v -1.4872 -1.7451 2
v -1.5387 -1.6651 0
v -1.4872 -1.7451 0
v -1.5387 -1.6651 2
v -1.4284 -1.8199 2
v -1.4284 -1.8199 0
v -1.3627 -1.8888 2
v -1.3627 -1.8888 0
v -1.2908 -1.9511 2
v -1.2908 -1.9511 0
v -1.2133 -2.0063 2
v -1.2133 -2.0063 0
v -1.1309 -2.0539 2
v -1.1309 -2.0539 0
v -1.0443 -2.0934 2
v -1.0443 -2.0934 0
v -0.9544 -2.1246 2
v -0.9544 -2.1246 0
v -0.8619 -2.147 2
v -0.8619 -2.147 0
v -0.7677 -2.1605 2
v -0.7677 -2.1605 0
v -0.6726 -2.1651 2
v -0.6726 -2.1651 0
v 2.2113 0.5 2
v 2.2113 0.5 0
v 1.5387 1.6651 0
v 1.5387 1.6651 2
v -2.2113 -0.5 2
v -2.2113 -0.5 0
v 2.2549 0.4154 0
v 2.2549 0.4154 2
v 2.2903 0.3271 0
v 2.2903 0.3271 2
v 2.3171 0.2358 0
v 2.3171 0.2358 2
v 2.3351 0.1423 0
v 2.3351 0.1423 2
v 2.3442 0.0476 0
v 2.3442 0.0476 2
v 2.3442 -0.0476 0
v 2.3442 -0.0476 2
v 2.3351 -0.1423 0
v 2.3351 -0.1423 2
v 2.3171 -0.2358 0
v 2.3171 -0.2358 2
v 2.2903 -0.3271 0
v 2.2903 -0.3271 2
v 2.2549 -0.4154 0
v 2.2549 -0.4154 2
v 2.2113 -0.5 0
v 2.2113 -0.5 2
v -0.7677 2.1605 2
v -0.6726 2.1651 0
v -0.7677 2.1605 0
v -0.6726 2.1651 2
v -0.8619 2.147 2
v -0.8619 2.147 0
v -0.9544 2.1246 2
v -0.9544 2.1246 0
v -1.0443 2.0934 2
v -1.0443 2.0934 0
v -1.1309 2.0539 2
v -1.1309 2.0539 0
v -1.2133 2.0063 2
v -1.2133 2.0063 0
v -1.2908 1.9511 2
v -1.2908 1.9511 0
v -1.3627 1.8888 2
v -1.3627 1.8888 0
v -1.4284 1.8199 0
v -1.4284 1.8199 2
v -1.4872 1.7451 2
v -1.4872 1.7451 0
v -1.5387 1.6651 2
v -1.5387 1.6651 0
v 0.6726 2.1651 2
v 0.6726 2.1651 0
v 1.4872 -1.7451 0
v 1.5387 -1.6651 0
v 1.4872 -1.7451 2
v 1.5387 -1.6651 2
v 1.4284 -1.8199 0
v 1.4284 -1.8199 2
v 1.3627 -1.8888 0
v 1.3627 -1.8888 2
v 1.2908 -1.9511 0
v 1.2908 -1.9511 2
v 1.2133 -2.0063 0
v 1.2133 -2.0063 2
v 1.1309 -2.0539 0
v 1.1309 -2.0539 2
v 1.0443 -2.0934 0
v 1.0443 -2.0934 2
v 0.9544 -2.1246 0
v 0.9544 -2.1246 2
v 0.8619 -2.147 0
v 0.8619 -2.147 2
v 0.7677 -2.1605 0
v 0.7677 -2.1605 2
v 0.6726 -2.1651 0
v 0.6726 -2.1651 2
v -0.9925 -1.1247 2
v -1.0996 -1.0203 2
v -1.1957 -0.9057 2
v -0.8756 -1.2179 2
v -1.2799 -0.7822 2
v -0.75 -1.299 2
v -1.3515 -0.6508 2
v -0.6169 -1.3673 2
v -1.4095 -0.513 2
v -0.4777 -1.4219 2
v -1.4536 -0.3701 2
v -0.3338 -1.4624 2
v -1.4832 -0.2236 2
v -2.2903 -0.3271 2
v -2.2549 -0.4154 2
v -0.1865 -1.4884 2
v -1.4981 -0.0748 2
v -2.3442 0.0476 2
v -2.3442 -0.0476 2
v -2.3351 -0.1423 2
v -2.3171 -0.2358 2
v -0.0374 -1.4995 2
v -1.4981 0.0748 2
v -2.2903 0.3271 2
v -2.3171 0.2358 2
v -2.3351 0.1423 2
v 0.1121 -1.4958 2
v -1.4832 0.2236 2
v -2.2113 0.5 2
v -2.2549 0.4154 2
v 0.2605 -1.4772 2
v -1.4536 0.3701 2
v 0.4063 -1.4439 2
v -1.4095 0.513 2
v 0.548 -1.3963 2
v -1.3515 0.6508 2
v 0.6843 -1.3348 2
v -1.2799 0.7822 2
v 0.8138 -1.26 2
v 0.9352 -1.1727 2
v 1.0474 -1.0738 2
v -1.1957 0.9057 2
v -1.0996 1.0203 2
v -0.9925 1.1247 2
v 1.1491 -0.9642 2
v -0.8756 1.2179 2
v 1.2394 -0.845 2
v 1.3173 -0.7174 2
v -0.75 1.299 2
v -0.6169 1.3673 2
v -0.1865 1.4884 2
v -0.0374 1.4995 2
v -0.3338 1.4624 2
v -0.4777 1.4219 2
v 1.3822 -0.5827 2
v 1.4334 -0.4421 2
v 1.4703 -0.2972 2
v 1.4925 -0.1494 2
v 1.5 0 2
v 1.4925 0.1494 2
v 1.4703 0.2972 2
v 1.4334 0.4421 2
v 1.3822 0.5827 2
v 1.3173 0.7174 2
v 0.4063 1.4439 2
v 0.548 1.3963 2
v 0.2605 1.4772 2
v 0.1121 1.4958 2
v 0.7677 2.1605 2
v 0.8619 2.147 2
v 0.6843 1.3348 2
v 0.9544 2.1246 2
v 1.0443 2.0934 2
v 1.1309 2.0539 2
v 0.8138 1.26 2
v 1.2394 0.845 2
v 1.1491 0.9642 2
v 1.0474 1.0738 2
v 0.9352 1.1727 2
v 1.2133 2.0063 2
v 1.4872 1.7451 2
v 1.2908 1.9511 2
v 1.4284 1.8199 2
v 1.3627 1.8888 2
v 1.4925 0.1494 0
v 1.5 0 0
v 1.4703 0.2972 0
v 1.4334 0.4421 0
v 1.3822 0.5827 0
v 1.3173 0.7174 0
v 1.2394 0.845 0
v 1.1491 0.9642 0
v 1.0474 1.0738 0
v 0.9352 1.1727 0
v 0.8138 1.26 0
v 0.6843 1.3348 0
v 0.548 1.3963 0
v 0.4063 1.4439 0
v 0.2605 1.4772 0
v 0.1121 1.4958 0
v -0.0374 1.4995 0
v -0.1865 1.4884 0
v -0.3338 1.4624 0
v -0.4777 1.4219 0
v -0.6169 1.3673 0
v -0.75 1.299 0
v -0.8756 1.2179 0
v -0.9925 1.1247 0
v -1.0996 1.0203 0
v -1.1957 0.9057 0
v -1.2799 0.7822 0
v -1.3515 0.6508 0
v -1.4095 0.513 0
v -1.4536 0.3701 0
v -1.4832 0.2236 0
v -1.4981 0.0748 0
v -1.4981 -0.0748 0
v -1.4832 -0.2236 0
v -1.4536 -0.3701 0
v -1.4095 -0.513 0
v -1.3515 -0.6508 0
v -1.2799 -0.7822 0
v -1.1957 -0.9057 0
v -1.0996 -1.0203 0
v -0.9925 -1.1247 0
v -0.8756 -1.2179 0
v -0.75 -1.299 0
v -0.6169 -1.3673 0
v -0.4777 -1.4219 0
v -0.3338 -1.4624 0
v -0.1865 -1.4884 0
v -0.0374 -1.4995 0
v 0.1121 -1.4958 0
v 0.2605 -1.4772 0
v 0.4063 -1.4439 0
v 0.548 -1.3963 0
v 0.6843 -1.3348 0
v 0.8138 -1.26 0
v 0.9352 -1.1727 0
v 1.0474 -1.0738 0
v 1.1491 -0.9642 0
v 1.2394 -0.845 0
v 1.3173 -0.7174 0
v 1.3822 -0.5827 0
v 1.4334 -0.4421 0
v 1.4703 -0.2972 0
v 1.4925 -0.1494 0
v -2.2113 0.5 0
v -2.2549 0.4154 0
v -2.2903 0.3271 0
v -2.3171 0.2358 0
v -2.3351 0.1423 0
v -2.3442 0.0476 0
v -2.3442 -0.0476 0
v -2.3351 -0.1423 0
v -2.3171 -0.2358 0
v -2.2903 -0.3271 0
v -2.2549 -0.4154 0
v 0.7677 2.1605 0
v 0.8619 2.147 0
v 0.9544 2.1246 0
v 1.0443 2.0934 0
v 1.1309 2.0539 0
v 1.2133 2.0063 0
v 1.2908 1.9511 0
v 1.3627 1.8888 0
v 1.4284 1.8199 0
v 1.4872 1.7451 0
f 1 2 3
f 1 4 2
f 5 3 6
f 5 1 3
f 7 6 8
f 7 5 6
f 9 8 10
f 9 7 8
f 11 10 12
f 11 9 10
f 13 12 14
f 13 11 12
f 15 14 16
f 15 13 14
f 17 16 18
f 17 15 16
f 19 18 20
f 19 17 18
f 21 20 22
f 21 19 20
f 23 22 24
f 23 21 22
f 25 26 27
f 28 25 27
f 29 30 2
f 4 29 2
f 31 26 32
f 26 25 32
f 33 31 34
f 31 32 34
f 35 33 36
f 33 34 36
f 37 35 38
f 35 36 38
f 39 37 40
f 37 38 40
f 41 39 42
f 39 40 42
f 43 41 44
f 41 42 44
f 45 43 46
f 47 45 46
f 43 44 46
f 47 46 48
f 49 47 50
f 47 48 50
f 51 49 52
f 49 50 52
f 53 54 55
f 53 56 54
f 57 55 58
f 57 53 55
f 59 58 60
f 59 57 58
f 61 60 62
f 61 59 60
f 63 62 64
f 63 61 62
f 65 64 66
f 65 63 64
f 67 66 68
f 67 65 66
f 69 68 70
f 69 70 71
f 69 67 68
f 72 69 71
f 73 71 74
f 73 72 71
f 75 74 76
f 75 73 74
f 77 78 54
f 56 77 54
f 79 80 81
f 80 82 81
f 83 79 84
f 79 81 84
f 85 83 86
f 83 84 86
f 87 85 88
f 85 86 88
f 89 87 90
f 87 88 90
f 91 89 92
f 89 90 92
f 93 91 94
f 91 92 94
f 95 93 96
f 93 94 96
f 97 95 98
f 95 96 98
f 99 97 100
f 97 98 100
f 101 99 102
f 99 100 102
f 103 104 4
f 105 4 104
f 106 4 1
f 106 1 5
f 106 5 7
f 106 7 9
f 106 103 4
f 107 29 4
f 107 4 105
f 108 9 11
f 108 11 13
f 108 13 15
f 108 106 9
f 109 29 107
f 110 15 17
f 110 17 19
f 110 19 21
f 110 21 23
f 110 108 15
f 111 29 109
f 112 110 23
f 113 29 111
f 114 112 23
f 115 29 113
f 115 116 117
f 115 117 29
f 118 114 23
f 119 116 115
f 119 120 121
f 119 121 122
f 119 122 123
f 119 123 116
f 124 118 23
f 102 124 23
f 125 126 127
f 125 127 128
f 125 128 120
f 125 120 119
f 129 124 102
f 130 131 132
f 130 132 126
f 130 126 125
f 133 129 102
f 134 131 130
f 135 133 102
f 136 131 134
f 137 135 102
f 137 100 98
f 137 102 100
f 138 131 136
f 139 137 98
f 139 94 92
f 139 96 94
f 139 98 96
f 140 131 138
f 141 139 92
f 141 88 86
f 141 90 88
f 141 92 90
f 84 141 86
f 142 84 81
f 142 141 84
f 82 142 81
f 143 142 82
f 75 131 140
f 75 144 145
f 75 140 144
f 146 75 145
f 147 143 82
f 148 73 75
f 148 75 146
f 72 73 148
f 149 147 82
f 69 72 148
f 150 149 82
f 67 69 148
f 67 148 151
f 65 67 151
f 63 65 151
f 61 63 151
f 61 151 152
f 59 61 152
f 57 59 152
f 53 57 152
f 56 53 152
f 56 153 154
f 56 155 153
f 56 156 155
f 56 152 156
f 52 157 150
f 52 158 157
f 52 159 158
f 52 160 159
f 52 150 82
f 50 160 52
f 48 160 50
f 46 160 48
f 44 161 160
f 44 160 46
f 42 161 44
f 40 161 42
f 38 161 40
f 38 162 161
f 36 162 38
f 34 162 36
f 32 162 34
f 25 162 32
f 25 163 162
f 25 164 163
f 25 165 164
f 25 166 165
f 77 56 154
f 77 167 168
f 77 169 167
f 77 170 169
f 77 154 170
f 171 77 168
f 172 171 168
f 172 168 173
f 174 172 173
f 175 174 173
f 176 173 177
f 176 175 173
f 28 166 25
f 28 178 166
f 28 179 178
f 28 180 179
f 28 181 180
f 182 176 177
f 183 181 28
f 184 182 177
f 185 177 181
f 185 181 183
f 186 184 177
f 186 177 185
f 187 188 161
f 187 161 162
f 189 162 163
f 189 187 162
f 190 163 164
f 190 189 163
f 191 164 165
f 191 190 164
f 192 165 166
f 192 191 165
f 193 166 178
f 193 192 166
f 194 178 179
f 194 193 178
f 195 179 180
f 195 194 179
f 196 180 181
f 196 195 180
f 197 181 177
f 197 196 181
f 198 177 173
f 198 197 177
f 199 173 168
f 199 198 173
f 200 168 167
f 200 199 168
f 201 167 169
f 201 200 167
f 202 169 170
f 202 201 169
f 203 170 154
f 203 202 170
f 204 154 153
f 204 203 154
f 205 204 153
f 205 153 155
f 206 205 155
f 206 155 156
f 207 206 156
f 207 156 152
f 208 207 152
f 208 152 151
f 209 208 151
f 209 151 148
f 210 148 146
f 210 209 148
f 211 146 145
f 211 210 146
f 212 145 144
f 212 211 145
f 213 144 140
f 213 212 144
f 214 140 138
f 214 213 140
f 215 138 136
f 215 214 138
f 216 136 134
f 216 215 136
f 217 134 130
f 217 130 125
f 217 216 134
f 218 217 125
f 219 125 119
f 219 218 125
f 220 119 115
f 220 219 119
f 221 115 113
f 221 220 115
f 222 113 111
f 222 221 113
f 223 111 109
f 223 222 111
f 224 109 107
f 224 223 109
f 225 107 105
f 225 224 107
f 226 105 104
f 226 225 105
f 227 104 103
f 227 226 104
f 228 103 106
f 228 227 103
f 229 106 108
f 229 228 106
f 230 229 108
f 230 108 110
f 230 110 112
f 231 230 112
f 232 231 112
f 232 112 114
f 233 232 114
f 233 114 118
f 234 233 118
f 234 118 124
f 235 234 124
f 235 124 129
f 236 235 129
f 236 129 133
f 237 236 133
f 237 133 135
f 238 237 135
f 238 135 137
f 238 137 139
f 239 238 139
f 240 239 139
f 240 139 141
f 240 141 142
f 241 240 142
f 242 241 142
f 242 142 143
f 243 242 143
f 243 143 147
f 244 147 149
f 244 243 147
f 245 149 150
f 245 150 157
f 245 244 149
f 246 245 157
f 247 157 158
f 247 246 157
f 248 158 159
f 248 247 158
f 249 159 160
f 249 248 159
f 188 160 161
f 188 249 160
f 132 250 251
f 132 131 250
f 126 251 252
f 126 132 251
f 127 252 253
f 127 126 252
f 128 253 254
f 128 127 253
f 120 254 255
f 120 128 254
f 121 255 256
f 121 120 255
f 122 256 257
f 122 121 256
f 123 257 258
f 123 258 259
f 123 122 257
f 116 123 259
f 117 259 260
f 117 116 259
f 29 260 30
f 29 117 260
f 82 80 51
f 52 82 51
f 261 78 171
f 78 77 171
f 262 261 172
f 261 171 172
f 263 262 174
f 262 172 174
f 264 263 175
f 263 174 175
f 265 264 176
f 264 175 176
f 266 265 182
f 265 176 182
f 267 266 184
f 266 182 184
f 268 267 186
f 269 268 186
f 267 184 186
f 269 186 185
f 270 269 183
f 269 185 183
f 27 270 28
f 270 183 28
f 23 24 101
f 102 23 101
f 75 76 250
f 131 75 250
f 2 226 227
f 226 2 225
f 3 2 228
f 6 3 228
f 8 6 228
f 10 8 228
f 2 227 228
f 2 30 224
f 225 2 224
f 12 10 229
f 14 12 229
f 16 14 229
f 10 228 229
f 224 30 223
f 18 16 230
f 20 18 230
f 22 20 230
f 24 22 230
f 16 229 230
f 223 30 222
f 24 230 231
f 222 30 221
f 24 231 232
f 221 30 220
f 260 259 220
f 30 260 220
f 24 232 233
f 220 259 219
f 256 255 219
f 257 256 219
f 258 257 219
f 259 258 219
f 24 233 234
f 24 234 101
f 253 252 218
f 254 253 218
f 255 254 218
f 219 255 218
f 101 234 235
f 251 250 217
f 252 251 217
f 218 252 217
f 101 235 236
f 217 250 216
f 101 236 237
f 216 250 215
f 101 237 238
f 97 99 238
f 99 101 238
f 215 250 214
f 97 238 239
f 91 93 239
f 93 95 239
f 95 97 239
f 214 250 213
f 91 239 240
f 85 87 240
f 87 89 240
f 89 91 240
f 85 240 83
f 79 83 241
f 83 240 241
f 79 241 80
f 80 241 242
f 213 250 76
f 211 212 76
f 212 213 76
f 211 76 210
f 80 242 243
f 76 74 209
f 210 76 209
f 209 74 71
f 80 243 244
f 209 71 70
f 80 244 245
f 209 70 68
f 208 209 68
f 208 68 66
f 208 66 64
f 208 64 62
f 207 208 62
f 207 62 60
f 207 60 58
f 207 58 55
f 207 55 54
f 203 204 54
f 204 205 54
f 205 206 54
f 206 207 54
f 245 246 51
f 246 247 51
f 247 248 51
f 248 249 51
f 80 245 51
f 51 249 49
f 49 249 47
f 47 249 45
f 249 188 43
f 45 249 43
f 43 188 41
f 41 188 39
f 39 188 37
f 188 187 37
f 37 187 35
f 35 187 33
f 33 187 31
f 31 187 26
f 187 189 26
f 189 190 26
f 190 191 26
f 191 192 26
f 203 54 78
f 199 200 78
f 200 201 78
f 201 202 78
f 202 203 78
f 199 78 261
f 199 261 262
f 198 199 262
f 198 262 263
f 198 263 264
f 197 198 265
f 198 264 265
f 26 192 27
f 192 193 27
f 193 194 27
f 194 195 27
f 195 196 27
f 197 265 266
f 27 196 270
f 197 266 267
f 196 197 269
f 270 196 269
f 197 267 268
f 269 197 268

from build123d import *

# Parameters (mm, degrees)
CROQUIS1_R              = 1.5
SALIENTE_EXTRUIR1_DEPTH = 2
REDONDEO1_R             = 1


with BuildPart() as part:
    # Croquis1 → Saliente-Extruir1 (new body)
    with BuildSketch(Plane.XY):
        Polygon((1.25, 2.165063509), (-1.25, 2.165063509), (-2.5, 0), (-1.25, -2.165063509), (1.25, -2.165063509), (2.5, 0), align=None)
        Circle(CROQUIS1_R, mode=Mode.SUBTRACT)
    extrude(amount=SALIENTE_EXTRUIR1_DEPTH)

    # Redondeo1
    redondeo1_edges = [part.edges().sort_by_distance(p)[0] for p in [
        (2.5, 0, 1),
        (1.25, -2.165063509, 1),
        (-1.25, -2.165063509, 1),
        (-2.5, 0, 1),
        (-1.25, 2.165063509, 1),
        (1.25, 2.165063509, 1),
    ]]
    fillet(redondeo1_edges, radius=REDONDEO1_R)


solid = part.part
